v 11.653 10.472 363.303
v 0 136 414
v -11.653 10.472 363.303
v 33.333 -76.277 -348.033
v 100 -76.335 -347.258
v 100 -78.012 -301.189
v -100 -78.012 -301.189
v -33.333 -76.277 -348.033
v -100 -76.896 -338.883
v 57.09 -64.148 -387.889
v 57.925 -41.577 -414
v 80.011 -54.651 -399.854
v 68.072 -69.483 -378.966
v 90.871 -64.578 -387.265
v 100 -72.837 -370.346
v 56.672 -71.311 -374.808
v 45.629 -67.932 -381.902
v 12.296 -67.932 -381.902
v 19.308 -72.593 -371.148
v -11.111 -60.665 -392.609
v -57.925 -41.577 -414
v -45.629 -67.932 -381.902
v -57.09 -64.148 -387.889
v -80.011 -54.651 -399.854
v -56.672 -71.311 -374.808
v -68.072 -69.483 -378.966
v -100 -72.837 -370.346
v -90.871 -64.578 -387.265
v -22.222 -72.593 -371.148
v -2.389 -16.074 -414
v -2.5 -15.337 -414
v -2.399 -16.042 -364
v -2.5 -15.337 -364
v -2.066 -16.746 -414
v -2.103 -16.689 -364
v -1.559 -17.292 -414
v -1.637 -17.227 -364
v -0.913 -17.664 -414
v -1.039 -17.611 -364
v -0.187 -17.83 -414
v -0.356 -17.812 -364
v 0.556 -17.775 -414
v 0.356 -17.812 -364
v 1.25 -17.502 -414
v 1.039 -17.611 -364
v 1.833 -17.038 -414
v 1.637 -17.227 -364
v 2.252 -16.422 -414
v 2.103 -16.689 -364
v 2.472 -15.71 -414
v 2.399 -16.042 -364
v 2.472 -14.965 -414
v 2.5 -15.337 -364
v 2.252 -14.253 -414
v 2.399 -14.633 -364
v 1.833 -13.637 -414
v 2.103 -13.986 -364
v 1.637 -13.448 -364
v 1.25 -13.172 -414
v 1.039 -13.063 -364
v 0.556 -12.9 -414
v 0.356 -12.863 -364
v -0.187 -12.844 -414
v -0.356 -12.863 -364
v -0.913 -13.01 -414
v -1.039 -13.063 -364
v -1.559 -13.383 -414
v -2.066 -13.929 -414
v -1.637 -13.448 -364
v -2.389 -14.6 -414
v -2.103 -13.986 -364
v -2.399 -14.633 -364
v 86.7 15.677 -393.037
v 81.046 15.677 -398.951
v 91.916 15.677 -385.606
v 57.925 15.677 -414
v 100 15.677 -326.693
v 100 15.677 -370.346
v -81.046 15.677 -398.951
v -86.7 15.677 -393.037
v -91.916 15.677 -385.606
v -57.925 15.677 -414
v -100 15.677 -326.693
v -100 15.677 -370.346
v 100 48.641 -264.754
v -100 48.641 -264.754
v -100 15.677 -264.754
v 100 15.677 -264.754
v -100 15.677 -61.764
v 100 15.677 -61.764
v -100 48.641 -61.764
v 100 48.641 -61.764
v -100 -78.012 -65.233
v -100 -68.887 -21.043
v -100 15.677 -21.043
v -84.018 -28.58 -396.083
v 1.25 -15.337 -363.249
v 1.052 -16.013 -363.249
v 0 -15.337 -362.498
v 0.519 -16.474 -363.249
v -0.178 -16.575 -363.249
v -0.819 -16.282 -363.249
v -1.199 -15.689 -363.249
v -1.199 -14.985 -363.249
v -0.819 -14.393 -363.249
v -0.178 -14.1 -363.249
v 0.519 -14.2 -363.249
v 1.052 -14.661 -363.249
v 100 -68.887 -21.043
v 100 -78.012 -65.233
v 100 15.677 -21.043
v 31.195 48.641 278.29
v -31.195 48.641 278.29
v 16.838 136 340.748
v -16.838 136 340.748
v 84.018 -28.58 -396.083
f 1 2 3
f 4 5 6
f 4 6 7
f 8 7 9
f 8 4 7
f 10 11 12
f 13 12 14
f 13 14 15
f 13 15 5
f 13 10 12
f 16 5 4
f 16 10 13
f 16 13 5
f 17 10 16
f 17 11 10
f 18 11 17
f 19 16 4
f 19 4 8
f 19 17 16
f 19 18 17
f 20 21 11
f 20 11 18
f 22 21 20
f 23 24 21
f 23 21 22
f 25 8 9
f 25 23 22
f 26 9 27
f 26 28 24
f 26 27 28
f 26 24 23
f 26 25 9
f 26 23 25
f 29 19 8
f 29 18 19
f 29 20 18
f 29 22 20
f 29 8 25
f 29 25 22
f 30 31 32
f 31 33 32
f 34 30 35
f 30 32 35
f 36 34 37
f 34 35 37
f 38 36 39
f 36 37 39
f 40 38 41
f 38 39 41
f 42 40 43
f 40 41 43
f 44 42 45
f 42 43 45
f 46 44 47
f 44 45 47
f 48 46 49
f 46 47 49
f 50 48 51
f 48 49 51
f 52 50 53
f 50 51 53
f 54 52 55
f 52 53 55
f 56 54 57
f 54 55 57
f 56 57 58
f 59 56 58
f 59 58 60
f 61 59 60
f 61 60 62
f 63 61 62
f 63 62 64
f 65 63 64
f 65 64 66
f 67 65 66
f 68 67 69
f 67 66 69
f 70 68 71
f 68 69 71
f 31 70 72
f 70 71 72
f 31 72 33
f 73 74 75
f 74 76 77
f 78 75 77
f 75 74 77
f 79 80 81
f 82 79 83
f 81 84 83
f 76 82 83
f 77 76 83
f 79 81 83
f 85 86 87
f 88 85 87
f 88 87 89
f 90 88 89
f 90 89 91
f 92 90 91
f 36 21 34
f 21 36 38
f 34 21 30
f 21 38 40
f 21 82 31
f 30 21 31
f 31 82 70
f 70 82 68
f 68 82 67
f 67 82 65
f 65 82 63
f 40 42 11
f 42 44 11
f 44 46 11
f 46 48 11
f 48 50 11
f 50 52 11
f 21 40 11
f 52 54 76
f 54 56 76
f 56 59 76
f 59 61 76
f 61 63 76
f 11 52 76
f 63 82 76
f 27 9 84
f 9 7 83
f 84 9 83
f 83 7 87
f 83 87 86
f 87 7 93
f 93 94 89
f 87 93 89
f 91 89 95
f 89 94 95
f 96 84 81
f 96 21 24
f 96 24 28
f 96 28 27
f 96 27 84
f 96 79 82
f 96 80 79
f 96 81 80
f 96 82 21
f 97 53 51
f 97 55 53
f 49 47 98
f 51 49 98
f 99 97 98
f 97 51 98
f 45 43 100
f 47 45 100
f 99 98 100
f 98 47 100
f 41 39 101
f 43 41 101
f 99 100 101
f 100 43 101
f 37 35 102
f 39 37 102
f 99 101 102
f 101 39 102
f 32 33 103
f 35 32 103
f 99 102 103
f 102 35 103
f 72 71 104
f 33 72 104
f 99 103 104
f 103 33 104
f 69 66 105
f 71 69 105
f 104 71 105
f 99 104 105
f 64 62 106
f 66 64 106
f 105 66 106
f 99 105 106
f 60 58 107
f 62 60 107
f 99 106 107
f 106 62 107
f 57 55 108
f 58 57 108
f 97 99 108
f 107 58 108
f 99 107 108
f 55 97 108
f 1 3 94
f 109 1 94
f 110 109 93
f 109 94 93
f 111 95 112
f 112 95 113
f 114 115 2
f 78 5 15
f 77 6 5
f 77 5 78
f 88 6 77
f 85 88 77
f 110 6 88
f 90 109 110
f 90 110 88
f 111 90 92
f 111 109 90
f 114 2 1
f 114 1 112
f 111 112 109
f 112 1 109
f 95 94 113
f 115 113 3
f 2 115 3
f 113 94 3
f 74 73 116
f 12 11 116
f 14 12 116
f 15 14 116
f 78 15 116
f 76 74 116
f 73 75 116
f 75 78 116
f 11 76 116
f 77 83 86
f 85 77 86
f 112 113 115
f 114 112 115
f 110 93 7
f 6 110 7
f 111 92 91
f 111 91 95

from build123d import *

# Parameters (mm, degrees)
F0_W     = 200
F0_H     = 272
F1_DEPTH = 414
F3_DEPTH = 200.001
F5_DEPTH = 214.0125203069
F7_D     = 5
F7_DEPTH = 50
F7_TIP   = 1.5021515476


with BuildPart() as f1:
    # F0 (on Top) → F1 (new body, symmetric)
    with BuildSketch(Plane.XY):
        Rectangle(F0_W, F0_H)
    extrude(amount=F1_DEPTH, both=True)

    # F2 (on face) → F3 (cut, through all)
    with BuildSketch(Plane(origin=(-100, 0, 0), x_dir=(0, -1, 0), z_dir=(-1, 0, 0))):
        Polygon((-48.6409515142, 278.2896161079), (-136, 340.7483696938), (-136, -414), (-15.6766073778, -414), (-15.6766073778, -326.6927754041), (-48.640947789, -264.7544890642), (-15.6766073778, -264.7544890642), (-15.6766073778, -61.7635734379), (-48.640947789, -61.7635734379), (-15.6766073778, -21.04292392), align=None)
        with BuildLine():
            Line((136, 414), (-136, 414))
            Line((-136, 414), (-10.4717324721, 363.3029013872))
            Line((-10.4717324721, 363.3029013872), (78.0115202069, -65.2334988117))
            Line((78.0115202069, -65.2334988117), (78.0115202069, -301.1887669563))
            add(Edge.make_bspline(
                [(41.577257216, -414), (52.5528446959, -402.42919259), (72.8831837624, -381.0445803549), (76.791037733, -347.6423075278), (78.0115202069, -317.6310269751), (78.0115202069, -301.1887669563)],
                knots=[0, 0, 0, 0, 0.3478343827, 0.6428666129, 1, 1, 1, 1], degree=3))
            Line((41.577257216, -414), (136, -414))
            Line((136, -414), (136, 414))
        make_face()
    extrude(amount=-F3_DEPTH, mode=Mode.SUBTRACT)

    # F4 (on face) → F5 (cut, through all)
    with BuildSketch(Plane.XZ.offset(78.0115202069)):
        Polygon((-100, -21.04292392), (0, 414), (-100, 414), (-100, 340.7483696938), (-100, 278.2896161079), align=None)
        Polygon((100, 414), (0, 414), (100, -21.04292392), (100, 278.2896161079), (100, 340.7483696938), align=None)
        with BuildLine():
            Line((57.925209403, -414), (100, -414))
            Line((100, -414), (100, -370.346387702))
            add(Edge.make_bspline(
                [(100, -370.346387702), (95.4592593145, -379.6018433489), (86.2772620908, -398.3176375197), (67.4446143257, -408.7345343832), (57.925209403, -414)],
                knots=[0, 0, 0, 0, 0.4945264712, 1, 1, 1, 1], degree=3))
        make_face()
        with BuildLine():
            Line((-100, -414), (-57.925209403, -414))
            add(Edge.make_bspline(
                [(-100, -370.346387702), (-95.4592593145, -379.6018433489), (-86.2772620908, -398.3176375197), (-67.4446143257, -408.7345343832), (-57.925209403, -414)],
                knots=[0, 0, 0, 0, 0.4945264712, 1, 1, 1, 1], degree=3))
            Line((-100, -370.346387702), (-100, -414))
        make_face()
    extrude(amount=-F5_DEPTH, mode=Mode.SUBTRACT)

    # F7
    with Locations(Plane(origin=(0, 0, -414), x_dir=(1, 0, 0), z_dir=(0, 0, -1))):
        with Locations((0, 15.3372772038)):
            Hole(F7_D / 2, depth=F7_DEPTH)
            with Locations((0, 0, -(F7_DEPTH + F7_TIP / 2))):  # 118° drill point
                Cone(0, F7_D / 2, F7_TIP, mode=Mode.SUBTRACT)


solid = f1.part
